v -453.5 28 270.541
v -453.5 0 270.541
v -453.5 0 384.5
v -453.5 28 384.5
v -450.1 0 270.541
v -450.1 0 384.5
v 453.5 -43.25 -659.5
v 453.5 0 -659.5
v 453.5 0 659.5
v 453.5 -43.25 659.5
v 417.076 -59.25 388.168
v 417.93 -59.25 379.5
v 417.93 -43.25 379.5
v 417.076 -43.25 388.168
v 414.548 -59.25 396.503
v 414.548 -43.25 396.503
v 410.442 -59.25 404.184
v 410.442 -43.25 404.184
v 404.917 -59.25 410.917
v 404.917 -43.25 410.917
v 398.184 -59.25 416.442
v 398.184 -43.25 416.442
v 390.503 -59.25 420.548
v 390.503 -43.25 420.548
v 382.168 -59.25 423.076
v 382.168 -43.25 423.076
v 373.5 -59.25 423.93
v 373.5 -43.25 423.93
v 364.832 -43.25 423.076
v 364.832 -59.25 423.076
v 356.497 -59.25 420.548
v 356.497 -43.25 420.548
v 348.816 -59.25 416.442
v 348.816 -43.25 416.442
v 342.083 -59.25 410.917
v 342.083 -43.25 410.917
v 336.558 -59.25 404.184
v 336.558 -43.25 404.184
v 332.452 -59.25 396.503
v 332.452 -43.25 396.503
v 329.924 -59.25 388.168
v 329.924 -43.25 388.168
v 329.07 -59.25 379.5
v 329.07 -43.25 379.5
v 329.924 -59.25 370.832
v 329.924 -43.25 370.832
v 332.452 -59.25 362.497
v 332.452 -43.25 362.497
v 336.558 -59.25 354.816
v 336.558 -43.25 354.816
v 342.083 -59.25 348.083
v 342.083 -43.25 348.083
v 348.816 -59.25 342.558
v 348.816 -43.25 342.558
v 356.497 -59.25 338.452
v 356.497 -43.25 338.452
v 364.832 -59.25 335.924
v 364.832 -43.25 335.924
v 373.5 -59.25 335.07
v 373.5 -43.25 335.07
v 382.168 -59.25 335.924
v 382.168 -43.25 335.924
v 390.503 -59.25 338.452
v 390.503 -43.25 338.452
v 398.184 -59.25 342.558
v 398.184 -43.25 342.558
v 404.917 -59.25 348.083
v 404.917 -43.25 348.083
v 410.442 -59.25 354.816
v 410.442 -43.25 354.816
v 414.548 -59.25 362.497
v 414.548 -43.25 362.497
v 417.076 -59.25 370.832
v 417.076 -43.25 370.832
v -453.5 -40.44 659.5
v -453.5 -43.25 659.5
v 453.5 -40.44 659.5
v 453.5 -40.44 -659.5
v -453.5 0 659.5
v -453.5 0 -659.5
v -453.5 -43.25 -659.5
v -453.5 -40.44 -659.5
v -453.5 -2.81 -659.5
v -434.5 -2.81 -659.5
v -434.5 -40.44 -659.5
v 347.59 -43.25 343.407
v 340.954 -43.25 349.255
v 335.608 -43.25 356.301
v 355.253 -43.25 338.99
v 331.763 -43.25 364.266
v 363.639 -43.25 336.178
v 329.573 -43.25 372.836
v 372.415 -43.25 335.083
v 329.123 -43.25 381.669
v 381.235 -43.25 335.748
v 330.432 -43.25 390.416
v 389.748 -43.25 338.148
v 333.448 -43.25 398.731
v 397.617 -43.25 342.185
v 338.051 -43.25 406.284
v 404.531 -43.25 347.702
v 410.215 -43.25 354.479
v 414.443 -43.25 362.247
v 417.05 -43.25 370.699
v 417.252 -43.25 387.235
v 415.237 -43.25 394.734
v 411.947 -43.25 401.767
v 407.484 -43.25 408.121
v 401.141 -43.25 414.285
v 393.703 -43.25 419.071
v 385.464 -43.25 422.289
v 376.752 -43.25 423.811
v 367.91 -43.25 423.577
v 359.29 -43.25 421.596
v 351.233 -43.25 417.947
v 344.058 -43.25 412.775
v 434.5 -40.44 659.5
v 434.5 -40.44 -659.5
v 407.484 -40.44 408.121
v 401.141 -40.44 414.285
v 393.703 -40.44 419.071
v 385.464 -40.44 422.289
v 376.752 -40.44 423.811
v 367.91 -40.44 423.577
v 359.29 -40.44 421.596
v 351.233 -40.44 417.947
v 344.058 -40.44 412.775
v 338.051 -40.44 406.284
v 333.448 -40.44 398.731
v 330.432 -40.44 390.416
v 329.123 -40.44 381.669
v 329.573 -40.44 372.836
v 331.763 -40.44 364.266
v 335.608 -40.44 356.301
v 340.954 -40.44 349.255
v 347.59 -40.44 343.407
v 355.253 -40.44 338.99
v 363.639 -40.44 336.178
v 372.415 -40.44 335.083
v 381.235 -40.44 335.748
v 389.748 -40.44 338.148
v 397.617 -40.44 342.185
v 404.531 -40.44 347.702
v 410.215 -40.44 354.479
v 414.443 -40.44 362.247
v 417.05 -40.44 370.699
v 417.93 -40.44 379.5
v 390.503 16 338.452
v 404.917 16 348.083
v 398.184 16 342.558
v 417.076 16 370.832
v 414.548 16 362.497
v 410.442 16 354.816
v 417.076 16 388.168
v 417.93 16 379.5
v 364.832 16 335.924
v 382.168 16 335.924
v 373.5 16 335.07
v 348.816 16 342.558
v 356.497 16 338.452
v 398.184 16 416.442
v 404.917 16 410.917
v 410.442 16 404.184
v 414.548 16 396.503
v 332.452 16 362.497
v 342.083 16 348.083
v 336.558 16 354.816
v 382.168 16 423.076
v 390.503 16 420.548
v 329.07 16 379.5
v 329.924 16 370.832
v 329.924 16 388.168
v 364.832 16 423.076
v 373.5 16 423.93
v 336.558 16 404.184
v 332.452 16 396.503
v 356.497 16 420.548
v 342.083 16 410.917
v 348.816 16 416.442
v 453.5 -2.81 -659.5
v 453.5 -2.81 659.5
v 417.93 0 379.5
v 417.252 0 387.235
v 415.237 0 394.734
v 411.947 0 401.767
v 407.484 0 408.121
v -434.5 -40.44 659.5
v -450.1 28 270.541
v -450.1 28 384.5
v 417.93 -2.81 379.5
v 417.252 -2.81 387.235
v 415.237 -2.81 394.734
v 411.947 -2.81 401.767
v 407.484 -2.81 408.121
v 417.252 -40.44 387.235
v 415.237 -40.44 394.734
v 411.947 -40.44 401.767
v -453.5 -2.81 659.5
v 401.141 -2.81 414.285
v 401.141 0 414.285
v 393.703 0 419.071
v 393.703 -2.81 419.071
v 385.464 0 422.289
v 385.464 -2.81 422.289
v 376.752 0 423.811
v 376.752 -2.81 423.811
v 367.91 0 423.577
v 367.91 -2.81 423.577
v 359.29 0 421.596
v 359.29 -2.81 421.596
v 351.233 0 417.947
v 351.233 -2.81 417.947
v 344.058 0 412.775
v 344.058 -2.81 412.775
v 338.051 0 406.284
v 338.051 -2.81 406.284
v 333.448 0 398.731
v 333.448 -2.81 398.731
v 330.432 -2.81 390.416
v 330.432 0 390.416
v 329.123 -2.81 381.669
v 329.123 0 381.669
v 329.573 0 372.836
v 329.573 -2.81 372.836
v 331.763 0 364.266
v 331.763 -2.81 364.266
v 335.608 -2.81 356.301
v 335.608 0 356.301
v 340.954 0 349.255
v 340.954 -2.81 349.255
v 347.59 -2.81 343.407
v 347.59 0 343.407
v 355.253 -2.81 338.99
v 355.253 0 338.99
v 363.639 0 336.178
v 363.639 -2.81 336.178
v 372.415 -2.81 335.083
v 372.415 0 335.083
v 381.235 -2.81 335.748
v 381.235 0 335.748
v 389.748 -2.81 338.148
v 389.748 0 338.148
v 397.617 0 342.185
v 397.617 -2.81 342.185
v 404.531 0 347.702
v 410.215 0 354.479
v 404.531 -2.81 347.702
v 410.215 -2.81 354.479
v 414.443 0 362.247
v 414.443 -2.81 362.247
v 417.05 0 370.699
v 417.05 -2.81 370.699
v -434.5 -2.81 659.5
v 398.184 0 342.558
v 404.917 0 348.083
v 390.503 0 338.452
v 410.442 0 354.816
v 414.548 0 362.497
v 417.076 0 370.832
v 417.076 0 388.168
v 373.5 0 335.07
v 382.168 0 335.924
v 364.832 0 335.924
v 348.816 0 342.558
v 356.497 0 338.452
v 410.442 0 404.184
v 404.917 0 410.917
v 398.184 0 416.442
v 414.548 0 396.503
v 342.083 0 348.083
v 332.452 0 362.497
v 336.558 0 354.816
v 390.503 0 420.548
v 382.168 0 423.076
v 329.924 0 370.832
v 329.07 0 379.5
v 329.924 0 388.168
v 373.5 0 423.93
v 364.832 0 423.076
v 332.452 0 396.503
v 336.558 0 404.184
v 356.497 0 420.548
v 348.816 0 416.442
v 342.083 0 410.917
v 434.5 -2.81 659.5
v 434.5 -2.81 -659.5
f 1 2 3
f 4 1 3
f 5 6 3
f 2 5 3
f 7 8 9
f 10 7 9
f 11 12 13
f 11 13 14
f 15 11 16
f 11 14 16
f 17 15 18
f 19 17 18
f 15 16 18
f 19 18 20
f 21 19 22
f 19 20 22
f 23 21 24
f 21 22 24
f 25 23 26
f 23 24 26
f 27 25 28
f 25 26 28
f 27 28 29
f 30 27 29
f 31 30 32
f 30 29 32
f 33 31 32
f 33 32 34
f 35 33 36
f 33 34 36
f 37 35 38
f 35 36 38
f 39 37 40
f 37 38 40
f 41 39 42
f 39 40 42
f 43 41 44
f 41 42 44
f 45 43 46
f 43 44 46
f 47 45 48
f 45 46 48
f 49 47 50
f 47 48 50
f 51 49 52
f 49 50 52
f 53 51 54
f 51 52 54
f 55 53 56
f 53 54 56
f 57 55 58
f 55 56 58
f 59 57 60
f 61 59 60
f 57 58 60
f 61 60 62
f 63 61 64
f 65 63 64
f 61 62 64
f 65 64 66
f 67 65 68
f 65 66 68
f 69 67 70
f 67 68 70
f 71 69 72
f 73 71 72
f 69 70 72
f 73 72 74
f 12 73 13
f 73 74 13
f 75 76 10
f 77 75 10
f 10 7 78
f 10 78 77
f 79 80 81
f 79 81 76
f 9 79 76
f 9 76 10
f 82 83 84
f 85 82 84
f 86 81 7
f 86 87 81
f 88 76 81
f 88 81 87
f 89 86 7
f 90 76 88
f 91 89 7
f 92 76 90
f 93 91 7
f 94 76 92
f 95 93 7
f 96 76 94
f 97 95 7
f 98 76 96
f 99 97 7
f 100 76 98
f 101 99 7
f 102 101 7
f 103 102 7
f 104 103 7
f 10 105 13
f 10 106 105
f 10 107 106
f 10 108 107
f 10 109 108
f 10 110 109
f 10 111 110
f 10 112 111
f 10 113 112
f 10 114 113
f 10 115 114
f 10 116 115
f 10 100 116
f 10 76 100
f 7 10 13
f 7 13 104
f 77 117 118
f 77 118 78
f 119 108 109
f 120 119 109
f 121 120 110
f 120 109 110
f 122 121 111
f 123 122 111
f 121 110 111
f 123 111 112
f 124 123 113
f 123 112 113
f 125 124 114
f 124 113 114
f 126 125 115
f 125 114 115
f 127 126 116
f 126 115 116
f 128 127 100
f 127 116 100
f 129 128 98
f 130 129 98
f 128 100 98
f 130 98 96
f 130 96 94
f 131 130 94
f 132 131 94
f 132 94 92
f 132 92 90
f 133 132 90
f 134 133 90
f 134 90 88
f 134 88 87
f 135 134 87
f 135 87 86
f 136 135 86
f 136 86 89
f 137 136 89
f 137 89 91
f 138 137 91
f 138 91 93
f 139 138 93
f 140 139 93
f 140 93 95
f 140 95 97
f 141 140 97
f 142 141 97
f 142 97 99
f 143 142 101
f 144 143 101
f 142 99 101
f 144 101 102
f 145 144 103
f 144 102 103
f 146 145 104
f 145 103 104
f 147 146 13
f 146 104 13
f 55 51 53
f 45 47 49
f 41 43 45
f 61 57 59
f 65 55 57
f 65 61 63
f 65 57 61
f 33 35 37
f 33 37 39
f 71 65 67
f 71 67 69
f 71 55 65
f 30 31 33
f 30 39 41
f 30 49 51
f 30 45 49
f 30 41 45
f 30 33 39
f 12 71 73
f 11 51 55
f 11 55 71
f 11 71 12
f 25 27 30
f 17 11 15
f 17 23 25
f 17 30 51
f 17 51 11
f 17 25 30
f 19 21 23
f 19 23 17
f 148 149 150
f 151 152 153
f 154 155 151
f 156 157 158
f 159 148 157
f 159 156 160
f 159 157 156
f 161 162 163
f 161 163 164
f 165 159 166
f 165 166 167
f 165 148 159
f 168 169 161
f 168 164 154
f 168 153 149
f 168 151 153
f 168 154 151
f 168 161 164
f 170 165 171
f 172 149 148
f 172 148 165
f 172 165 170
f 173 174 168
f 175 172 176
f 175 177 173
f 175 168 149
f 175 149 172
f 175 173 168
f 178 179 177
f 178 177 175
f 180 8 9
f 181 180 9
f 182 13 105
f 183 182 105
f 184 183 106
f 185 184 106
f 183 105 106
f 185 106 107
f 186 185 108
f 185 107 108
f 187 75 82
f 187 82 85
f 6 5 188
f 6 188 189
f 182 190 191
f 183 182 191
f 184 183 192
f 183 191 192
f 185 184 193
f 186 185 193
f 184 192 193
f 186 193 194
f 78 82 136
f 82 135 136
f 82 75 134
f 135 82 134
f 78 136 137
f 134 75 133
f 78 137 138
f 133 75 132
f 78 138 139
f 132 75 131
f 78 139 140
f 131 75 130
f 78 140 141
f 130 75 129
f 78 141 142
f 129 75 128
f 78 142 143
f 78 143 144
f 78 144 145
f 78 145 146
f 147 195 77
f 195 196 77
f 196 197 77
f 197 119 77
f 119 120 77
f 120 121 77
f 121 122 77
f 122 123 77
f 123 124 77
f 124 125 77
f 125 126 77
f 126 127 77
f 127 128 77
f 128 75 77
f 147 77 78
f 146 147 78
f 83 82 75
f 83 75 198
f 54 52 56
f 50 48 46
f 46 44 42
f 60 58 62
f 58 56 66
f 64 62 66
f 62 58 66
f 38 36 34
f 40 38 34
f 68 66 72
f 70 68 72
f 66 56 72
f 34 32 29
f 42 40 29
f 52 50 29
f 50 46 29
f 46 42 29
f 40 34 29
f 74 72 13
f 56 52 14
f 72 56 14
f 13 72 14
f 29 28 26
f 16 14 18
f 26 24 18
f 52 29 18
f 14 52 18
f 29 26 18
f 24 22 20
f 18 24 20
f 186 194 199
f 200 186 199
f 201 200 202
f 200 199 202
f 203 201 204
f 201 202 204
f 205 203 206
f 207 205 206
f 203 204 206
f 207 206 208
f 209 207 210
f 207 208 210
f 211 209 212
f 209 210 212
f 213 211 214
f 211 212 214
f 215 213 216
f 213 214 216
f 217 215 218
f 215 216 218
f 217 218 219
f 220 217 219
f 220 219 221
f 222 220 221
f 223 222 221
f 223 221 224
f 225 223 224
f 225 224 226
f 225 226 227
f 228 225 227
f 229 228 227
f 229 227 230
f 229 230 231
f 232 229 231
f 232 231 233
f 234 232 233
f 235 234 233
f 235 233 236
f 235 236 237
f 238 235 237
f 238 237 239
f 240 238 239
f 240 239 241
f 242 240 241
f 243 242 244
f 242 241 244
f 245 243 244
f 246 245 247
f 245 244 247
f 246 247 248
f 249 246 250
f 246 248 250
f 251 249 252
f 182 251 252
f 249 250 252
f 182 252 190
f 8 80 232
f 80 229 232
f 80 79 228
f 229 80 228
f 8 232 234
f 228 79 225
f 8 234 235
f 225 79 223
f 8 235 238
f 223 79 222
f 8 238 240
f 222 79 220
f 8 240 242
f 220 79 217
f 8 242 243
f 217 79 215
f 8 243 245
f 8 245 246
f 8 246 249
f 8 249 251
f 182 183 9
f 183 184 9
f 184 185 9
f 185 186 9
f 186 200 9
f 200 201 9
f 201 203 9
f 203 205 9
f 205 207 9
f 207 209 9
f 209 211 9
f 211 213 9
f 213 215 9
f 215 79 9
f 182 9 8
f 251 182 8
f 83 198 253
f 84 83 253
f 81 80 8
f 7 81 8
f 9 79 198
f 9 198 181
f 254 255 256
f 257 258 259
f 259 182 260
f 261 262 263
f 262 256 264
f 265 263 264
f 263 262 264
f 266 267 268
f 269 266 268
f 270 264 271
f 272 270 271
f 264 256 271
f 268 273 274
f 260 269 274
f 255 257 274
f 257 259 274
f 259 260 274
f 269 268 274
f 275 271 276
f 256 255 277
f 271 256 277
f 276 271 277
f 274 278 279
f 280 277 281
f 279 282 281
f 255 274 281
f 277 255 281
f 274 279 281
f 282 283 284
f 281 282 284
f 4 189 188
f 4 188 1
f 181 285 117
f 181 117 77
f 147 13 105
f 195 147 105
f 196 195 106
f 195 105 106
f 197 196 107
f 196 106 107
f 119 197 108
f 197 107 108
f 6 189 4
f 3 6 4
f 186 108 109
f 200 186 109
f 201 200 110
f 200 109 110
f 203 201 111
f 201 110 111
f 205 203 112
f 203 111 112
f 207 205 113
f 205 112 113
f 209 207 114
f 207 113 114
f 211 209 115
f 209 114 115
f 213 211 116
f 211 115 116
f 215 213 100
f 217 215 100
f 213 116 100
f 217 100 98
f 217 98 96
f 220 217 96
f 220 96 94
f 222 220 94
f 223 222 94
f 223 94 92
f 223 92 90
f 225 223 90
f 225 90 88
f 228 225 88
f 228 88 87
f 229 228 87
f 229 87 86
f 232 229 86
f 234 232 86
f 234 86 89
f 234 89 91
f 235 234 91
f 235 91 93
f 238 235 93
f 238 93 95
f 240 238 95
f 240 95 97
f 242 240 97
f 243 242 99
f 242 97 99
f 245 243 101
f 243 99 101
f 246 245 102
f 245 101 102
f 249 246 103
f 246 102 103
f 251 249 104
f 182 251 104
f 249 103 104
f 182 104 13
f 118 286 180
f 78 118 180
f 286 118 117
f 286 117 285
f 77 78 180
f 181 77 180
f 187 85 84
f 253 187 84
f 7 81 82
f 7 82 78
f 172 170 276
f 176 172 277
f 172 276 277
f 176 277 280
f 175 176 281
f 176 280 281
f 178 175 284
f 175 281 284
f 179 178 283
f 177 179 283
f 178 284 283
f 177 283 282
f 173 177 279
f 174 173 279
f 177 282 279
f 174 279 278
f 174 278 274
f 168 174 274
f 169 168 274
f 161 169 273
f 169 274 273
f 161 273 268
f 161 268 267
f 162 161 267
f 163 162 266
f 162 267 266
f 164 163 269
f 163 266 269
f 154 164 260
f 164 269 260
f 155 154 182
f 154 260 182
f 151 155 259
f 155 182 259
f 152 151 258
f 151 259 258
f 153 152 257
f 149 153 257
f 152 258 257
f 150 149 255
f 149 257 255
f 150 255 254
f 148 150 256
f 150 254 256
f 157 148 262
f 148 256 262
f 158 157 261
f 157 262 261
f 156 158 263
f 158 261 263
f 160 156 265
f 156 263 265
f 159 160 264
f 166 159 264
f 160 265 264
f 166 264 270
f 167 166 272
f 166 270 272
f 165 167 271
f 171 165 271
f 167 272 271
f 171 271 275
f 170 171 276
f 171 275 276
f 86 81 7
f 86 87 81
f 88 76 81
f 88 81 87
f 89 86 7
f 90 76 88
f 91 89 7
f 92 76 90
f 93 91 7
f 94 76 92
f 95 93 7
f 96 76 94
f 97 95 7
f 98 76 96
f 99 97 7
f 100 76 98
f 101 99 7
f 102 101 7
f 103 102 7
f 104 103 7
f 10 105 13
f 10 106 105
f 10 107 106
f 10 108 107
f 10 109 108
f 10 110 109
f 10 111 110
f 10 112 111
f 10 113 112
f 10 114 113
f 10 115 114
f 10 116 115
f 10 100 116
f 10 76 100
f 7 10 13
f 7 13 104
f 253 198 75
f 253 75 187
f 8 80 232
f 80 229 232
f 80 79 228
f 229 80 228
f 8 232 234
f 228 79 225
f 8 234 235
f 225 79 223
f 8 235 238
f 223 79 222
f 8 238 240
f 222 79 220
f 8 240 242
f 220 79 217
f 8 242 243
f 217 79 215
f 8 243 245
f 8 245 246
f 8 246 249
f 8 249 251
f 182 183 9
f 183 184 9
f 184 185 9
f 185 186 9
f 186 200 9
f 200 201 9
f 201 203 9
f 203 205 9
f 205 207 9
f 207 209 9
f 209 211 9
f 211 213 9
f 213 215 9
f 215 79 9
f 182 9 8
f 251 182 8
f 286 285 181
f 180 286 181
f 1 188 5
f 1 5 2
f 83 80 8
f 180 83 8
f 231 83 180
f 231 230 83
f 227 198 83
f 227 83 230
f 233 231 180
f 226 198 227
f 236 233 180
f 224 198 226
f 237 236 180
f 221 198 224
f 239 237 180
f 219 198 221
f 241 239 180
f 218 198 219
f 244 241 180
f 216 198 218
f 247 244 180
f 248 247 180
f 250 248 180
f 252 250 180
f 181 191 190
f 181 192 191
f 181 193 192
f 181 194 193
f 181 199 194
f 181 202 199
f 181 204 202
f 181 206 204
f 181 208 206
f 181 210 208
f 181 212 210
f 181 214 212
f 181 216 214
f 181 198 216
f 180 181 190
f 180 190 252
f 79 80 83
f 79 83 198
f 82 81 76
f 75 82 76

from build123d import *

# Parameters (mm, degrees)
F0_W      = 907
F0_H      = 1319
F1_DEPTH  = 43.25
F2_DEPTH  = 2.81
F3_DEPTH  = 2.81
F5_DEPTH  = 43.251
F6_W      = 3.4
F6_H      = 113.9589877129
F7_DEPTH  = 28
F8_R      = 44.43
F9_DEPTH  = 16
F10_R     = 44.43
F11_DEPTH = 16
F12_W     = 19
F12_H     = 37.63
F13_DEPTH = 1319


with BuildPart() as f1:
    # F0 (on Front) → F1 (new body)
    with BuildSketch(Plane.XZ):
        Rectangle(F0_W, F0_H)
    extrude(amount=F1_DEPTH)


with BuildPart() as f2:
    # F2 (new): a face of the model
    f2_faces = [f1.part.faces().sort_by_distance(p)[0] for p in [
        (0, -43.25, 0),
    ]]
    extrude(f2_faces, amount=-F2_DEPTH)


with BuildPart() as f3:
    # F3 (new): a face of the model
    f3_faces = [f1.part.faces().sort_by_distance(p)[0] for p in [
        (0, 0, 0),
    ]]
    extrude(f3_faces, amount=-F3_DEPTH)


with BuildPart() as f5_tool:
    # F4 (on face) → F5 (new body, through all)
    with BuildSketch(Plane.XZ.offset(43.25)):
        with BuildLine():
            ThreePointArc((417.93, 379.5), (415.2367897113, 394.7336891327), (407.4836671352, 408.1205392689))
            Line((407.4836671352, 408.1205392689), (407.4836671352, 379.5))
            Line((407.4836671352, 379.5), (417.93, 379.5))
        make_face()
        with BuildLine():
            Line((407.4836671352, 379.5), (407.4836671352, 408.1205392689))
            ThreePointArc((407.4836671352, 408.1205392689), (331.7632102887, 364.2663108673), (417.93, 379.5))
            Line((417.93, 379.5), (407.4836671352, 379.5))
        make_face()
    extrude(amount=-F5_DEPTH)


with BuildPart() as f1_1:
    add(f1.part)

    # F5: cut by f5_tool
    add(f5_tool.part, mode=Mode.SUBTRACT)


with BuildPart() as f2_1:
    add(f2.part)

    # F5: cut by f5_tool
    add(f5_tool.part, mode=Mode.SUBTRACT)


with BuildPart() as f3_1:
    add(f3.part)

    # F5: cut by f5_tool
    add(f5_tool.part, mode=Mode.SUBTRACT)


with BuildPart() as f7:
    # F6 (on face) → F7 (new body)
    with BuildSketch(Plane(origin=(0, 0, 0), x_dir=(-1, 0, 0), z_dir=(0, 1, 0))):
        with Locations((451.8, 327.5205061436)):
            Rectangle(F6_W, F6_H)
    extrude(amount=F7_DEPTH)


with BuildPart() as f9:
    # F8 (on face) → F9 (new body)
    with BuildSketch(Plane.XZ.offset(43.25)):
        with Locations((373.5, 379.5)):
            Circle(F8_R)
    extrude(amount=F9_DEPTH)


with BuildPart() as f11:
    # F10 (on face) → F11 (new body)
    with BuildSketch(Plane(origin=(0, 0, 0), x_dir=(-1, 0, 0), z_dir=(0, 1, 0))):
        with Locations((-373.5, 379.5)):
            Circle(F10_R)
    extrude(amount=F11_DEPTH)


with BuildPart() as f13:
    # F12 (on face) → F13 (new body, through all)
    with BuildSketch(Plane.XY.offset(659.5)):
        with Locations((-444, -21.625)):
            Rectangle(F12_W, F12_H)
    extrude(amount=-F13_DEPTH)


with BuildPart() as f13b:
    # F12 (on face) → F13, piece 2 (new body, through all)
    with BuildSketch(Plane.XY.offset(659.5)):
        with Locations((444, -21.625)):
            Rectangle(F12_W, F12_H)
    extrude(amount=-F13_DEPTH)


solid = Compound([f1_1.part, f2_1.part, f3_1.part, f7.part, f9.part, f11.part, f13.part, f13b.part])
